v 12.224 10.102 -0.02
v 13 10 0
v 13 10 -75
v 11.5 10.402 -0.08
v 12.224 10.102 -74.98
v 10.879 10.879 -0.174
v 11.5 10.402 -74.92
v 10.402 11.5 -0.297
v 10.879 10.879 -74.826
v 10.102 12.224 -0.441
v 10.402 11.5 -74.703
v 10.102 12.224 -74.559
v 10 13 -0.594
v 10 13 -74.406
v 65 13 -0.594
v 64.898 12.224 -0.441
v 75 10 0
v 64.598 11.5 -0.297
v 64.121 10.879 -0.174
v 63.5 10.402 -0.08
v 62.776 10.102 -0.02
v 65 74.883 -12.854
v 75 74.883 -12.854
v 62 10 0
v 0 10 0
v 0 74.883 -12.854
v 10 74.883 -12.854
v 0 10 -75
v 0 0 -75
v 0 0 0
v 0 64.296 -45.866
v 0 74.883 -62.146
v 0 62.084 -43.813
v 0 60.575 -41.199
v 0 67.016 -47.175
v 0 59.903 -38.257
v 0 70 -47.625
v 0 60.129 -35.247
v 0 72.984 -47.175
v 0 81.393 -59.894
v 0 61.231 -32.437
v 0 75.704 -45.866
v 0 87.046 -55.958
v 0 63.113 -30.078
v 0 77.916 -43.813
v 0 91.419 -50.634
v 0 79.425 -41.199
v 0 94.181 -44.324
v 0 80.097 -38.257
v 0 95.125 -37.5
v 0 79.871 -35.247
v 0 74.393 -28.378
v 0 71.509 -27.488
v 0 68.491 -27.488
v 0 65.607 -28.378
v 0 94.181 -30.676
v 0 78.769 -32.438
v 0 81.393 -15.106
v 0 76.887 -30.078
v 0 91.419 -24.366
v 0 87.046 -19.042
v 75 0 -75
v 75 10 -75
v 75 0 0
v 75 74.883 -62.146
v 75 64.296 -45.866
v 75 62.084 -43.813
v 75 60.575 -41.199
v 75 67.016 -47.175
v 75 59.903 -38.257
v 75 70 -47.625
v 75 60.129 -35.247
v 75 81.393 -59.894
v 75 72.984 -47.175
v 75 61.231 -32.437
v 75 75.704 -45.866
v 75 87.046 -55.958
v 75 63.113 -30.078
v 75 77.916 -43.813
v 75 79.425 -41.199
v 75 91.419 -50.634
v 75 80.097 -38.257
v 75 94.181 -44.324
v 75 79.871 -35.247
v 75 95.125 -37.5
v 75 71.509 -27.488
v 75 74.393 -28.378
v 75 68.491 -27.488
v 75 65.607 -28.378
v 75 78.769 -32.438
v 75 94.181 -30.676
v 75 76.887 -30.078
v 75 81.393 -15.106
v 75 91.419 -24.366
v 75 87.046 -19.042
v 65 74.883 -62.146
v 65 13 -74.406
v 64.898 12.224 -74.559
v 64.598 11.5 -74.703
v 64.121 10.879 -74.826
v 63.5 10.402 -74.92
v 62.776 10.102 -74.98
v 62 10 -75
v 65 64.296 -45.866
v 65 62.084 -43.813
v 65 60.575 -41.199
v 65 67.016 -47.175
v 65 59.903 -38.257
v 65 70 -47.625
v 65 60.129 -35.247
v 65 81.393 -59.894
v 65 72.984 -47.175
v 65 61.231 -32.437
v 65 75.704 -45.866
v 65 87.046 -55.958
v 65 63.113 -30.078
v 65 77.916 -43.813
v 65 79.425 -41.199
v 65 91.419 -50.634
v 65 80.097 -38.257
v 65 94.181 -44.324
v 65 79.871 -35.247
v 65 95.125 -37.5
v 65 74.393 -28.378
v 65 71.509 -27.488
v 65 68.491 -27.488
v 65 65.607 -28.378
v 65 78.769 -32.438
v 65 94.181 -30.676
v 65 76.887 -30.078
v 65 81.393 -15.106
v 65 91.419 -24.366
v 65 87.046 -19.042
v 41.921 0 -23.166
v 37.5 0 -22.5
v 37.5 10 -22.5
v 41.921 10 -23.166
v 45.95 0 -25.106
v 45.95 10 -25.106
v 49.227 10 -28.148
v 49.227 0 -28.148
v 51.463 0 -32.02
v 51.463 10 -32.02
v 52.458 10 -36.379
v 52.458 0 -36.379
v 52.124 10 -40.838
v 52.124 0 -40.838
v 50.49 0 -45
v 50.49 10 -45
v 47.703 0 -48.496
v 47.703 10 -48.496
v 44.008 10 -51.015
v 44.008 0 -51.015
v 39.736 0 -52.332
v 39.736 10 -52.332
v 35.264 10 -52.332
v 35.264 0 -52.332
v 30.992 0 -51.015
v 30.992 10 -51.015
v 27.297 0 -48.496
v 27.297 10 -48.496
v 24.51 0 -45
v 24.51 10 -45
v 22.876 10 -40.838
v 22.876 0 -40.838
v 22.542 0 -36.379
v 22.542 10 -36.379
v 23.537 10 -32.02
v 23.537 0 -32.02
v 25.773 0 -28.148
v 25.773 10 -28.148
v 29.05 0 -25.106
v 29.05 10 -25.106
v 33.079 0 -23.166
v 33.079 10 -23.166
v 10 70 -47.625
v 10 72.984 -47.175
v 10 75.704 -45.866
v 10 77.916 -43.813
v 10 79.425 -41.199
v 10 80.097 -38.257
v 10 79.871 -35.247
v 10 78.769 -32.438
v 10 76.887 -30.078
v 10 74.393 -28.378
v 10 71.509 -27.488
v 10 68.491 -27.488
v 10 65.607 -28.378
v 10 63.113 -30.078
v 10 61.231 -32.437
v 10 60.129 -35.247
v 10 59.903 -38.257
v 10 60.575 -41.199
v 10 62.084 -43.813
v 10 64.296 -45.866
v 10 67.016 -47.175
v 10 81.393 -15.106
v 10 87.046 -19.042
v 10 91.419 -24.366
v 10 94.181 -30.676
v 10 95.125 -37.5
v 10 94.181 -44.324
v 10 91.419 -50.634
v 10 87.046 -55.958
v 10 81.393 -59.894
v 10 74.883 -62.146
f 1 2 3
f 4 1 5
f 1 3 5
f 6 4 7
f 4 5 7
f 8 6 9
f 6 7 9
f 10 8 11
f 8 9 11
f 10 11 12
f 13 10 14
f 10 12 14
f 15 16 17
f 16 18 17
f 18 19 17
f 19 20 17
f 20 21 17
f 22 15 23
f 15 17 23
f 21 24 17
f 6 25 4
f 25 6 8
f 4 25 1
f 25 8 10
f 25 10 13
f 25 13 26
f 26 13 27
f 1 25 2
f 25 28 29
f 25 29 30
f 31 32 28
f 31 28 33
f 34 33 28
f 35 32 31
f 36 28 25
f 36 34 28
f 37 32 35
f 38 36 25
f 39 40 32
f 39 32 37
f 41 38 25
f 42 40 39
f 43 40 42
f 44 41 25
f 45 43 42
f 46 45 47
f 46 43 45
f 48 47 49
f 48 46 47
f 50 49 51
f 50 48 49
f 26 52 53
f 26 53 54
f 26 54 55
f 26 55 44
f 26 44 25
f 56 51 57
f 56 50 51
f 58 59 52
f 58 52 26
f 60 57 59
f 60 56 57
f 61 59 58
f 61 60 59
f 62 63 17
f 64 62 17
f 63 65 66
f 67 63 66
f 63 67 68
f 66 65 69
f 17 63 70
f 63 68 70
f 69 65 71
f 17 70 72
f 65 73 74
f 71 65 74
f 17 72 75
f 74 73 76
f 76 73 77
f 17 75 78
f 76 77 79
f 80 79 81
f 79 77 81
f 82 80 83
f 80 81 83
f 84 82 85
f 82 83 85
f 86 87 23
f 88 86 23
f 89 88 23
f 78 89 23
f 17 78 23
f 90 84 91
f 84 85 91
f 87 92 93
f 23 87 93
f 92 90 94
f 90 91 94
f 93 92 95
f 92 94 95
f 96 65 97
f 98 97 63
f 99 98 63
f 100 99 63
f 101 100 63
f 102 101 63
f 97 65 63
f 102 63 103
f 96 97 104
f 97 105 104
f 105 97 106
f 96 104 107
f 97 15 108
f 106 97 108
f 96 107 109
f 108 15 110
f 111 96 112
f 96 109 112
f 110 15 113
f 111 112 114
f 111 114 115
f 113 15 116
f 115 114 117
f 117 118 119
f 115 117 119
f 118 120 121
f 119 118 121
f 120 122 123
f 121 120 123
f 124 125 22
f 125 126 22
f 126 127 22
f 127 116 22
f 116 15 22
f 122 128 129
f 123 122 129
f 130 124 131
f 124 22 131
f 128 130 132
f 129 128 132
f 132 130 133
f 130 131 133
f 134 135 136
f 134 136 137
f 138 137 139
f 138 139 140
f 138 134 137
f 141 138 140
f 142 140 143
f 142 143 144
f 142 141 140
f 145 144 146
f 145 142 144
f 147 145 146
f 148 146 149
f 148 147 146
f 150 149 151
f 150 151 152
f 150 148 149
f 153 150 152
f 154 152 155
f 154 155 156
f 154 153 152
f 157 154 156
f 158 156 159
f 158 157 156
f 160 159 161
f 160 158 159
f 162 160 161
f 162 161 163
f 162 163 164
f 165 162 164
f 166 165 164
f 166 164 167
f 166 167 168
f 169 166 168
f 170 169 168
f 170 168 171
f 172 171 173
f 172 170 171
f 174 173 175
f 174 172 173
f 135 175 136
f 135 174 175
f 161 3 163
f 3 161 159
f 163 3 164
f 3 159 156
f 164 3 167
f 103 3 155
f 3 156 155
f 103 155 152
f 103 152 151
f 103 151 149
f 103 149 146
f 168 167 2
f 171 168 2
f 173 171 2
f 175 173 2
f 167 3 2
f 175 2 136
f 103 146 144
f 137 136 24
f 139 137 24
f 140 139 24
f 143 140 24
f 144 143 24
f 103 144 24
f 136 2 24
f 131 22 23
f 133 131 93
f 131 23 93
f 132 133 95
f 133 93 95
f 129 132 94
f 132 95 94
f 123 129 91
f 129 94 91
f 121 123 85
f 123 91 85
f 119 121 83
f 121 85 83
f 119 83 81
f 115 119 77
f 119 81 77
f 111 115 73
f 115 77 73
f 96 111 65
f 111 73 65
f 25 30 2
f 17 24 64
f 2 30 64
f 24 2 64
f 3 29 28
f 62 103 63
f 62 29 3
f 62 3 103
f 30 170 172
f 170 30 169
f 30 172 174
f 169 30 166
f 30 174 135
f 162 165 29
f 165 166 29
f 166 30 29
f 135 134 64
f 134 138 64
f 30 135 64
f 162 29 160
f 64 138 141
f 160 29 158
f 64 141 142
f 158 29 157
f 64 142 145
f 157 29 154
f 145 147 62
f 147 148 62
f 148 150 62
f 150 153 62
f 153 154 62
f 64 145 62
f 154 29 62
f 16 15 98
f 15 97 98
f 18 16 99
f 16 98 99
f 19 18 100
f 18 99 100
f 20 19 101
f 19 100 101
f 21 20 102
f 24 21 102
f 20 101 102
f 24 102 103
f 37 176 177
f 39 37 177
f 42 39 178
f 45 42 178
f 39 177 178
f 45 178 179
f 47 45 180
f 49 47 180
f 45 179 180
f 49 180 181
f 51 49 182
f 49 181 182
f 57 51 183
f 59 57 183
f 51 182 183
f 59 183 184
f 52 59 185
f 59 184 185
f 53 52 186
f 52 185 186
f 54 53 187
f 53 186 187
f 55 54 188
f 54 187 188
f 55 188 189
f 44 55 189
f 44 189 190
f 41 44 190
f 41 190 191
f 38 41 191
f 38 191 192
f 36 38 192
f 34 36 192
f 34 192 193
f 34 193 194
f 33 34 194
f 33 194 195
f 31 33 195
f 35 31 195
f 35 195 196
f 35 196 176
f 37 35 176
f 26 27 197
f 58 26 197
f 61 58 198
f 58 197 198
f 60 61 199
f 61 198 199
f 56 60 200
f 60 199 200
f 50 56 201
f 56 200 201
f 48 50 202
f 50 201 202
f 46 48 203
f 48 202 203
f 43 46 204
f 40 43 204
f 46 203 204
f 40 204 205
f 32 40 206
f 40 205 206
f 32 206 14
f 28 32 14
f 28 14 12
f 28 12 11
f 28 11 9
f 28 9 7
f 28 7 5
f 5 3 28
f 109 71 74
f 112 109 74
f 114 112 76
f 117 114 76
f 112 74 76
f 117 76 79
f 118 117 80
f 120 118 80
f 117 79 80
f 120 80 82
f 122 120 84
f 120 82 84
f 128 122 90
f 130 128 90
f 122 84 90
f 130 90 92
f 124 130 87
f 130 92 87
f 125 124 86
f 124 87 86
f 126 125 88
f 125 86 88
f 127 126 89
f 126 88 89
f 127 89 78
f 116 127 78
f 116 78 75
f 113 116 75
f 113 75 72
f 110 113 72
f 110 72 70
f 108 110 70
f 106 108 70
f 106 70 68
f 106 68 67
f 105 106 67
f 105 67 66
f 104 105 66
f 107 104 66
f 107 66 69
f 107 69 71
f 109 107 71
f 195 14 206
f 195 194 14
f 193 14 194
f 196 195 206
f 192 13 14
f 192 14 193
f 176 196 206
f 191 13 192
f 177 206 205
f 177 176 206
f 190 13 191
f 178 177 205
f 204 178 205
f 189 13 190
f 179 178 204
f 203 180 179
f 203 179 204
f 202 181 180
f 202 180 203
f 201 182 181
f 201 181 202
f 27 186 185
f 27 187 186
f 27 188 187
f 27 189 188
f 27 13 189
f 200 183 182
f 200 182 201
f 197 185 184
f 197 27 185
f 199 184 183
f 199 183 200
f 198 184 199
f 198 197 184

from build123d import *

# Parameters (mm, degrees)
ESQUISSE1_W             = 75
ESQUISSE1_H             = 75
ESQUISSE1_R             = 15
BOSS_EXTRU_2_DEPTH      = 10
ESQUISSE2_R             = 10.125
BOSS_EXTRU_3_DEPTH      = 75
ESQUISSE3_W             = 55
ESQUISSE3_H             = 122.401822982
ENL_V_MAT_EXTRU_1_DEPTH = 143.473736615
CONG_1_R                = 3


with BuildPart() as part:
    # Esquisse1 → Boss.-Extru.2 (new body)
    with BuildSketch(Plane(origin=(0, 0, 0), x_dir=(1, 0, 0), z_dir=(0, 1, 0))):
        with Locations((37.5, 37.5)):
            Rectangle(ESQUISSE1_W, ESQUISSE1_H)
        with Locations(Location((37.5, 37.5, 0), (0, 0, 270))):
            Circle(ESQUISSE1_R, mode=Mode.SUBTRACT)
    extrude(amount=BOSS_EXTRU_2_DEPTH)

    # Esquisse2 → Boss.-Extru.3 (add)
    with BuildSketch(Plane(origin=(75, 0, 0), x_dir=(0, 0, -1), z_dir=(1, 0, 0))):
        with BuildLine():
            Line((62.145999584, 74.88265599), (75, 10))
            Line((75, 10), (0, 10))
            Line((0, 10), (12.854000416, 74.88265599))
            ThreePointArc((12.854000416, 74.88265599), (37.5, 95.125), (62.145999584, 74.88265599))
        make_face()
        with Locations((37.5, 70)):
            Circle(ESQUISSE2_R, mode=Mode.SUBTRACT)
    extrude(amount=-BOSS_EXTRU_3_DEPTH)

    # Esquisse3 → Enlèv. mat.-Extru.1 (cut, through all)
    with BuildSketch(Plane.XY):
        with Locations((37.5, 71.200911491)):
            Rectangle(ESQUISSE3_W, ESQUISSE3_H)
    extrude(amount=-ENL_V_MAT_EXTRU_1_DEPTH, mode=Mode.SUBTRACT)

    # Congé1
    cong_1_edges = [part.edges().sort_by_distance(p)[0] for p in [
        (10, 10, -37.5),
        (65, 10, -37.5),
    ]]
    fillet(cong_1_edges, radius=CONG_1_R)


solid = part.part
